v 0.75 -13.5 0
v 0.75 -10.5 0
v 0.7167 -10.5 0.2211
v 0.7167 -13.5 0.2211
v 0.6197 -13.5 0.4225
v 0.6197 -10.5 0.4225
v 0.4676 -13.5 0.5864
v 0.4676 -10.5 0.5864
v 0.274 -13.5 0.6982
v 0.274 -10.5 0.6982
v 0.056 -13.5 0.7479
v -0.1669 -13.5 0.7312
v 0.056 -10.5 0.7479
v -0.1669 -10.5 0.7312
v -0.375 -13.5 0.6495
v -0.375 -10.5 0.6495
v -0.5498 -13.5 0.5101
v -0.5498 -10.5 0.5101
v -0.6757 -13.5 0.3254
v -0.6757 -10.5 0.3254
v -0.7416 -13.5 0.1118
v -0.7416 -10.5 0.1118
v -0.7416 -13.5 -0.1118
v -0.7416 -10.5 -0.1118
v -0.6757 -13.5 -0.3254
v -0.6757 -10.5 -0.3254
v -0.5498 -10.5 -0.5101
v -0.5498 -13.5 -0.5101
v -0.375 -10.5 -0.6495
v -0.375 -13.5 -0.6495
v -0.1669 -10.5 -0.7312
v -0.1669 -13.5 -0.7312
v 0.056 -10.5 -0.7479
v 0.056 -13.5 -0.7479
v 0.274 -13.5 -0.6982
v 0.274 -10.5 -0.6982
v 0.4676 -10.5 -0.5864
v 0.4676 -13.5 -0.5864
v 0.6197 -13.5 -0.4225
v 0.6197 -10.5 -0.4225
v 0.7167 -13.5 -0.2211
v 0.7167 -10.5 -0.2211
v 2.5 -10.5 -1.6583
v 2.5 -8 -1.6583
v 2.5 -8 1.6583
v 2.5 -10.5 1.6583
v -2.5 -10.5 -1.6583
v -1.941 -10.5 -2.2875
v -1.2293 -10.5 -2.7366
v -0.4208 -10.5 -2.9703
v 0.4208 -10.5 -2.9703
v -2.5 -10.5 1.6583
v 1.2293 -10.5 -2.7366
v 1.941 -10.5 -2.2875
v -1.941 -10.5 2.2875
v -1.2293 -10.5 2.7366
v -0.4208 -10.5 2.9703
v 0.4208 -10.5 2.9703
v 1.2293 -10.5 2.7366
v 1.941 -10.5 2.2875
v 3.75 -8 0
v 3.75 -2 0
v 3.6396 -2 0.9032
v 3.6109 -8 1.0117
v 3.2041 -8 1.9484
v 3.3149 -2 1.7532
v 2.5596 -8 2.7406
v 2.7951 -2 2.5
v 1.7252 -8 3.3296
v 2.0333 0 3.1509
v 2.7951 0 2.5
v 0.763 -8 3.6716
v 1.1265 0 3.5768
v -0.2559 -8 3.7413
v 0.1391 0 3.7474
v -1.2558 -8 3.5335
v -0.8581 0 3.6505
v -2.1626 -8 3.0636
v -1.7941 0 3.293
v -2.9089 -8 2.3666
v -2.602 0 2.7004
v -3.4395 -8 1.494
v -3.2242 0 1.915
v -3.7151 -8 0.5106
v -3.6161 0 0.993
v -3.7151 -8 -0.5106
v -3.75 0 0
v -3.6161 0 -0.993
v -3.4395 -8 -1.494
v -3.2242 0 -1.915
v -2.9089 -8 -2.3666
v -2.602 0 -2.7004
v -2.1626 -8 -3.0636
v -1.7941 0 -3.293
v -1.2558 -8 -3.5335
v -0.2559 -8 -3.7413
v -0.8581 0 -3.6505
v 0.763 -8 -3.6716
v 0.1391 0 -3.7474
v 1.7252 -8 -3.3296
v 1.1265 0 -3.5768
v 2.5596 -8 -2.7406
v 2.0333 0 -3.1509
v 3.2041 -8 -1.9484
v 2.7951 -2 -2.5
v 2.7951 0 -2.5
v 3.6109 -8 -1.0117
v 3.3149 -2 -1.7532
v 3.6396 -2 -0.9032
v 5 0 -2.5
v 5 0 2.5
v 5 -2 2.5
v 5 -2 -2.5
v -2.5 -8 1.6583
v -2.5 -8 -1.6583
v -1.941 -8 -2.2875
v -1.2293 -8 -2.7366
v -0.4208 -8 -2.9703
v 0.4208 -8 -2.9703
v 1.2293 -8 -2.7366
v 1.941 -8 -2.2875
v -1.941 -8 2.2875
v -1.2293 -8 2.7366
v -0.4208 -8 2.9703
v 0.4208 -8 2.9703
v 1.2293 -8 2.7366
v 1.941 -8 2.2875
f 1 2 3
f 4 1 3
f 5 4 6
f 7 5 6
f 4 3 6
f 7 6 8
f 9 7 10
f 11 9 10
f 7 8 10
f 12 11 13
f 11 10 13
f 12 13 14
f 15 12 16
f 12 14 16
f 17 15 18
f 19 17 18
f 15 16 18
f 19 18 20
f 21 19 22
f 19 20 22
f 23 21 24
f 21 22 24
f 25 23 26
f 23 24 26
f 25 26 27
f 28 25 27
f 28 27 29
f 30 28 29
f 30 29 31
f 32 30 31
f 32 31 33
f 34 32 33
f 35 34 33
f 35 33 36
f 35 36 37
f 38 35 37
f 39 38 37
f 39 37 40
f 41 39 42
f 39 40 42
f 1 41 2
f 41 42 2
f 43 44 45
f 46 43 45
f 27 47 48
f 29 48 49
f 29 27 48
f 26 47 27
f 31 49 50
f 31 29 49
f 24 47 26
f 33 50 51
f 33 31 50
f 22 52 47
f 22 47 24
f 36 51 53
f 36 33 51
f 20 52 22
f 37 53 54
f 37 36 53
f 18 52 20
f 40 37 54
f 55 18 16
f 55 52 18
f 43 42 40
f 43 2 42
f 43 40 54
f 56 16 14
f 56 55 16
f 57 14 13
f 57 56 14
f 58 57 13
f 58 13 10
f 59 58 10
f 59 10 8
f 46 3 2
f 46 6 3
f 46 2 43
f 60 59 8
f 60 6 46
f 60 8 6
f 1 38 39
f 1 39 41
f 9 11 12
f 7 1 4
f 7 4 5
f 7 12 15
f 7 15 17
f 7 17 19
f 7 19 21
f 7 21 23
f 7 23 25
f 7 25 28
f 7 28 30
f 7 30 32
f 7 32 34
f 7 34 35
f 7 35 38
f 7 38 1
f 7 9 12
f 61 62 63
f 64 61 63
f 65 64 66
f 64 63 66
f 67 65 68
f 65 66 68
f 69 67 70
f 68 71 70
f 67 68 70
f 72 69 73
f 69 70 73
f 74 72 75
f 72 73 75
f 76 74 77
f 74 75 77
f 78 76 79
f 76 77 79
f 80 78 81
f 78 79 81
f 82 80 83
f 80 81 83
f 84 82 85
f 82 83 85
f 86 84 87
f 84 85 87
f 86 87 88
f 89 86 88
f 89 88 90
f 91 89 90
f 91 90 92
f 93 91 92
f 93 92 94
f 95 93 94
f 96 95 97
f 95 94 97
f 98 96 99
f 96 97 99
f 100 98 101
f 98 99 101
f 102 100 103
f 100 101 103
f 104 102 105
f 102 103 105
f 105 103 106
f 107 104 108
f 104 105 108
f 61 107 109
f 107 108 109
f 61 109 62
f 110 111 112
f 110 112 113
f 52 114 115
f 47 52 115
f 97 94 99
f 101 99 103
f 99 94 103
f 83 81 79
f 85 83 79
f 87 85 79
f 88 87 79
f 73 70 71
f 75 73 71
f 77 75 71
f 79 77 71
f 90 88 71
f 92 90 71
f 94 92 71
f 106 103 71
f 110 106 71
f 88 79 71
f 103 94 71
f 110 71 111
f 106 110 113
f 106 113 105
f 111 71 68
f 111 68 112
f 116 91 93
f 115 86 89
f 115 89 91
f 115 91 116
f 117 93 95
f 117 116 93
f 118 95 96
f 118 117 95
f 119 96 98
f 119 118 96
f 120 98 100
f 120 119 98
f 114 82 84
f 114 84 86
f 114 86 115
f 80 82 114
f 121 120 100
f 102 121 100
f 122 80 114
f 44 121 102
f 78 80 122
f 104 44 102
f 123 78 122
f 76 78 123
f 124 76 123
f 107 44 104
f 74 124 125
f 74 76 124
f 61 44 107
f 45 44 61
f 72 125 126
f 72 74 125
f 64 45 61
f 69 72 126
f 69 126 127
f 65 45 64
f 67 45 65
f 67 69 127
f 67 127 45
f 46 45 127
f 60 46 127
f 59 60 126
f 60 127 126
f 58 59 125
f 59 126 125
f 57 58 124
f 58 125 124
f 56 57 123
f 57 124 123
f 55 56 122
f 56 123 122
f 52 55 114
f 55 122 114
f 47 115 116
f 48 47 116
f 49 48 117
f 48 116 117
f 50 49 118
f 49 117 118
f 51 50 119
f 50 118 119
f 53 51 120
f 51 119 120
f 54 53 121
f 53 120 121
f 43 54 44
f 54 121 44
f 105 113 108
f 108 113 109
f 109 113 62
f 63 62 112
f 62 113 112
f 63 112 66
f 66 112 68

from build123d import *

# Parameters (mm, degrees)
F0_R     = 3.75
F1_DEPTH = 8
F3_DEPTH = 2.5
F4_R     = 0.75
F5_DEPTH = 3
F7_DEPTH = 2


# Not quite as in the source:
# - a feature names something its author has since deleted; it is built from what else it names


with BuildPart() as f1:
    # F0 (on Front) → F1 (new body)
    with BuildSketch(Plane.XZ):
        Circle(F0_R)
    extrude(amount=F1_DEPTH)

    # F2 (on face) → F3 (join)
    with BuildSketch(Plane.XZ.offset(8)):
        with BuildLine():
            Line((-2.5, 1.6583123952), (-2.5, -1.6583123952))
            ThreePointArc((-2.5, -1.6583123952), (0, -3), (2.5, -1.6583123952))
            Line((2.5, -1.6583123952), (2.5, 1.6583123952))
            ThreePointArc((2.5, 1.6583123952), (0, 3), (-2.5, 1.6583123952))
        make_face()
    extrude(amount=F3_DEPTH)

    # F4 (on face) → F5 (join)
    with BuildSketch(Plane.XZ.offset(10.5)):
        Circle(F4_R)
    extrude(amount=F5_DEPTH)

    # F6 (on face) → F7 (join)
    with BuildSketch(Plane(origin=(0, 0, 0), x_dir=(-1, 0, 0), z_dir=(0, 1, 0))):
        with BuildLine():
            Line((0, 2.5), (-2.7950849719, 2.5))
            ThreePointArc((-2.7950849719, 2.5), (-3.75, 0), (-2.7950849719, -2.5))
            Line((-2.7950849719, -2.5), (0, -2.5))
            Line((0, -2.5), (0, 2.5))
        make_face()
        with BuildLine():
            Line((-2.7950849719, 2.5), (-5, 2.5))
            Line((-5, 2.5), (-5, -2.5))
            Line((-5, -2.5), (-2.7950849719, -2.5))
            ThreePointArc((-2.7950849719, -2.5), (-3.75, 0), (-2.7950849719, 2.5))
        make_face()
    extrude(amount=-F7_DEPTH)


solid = f1.part
